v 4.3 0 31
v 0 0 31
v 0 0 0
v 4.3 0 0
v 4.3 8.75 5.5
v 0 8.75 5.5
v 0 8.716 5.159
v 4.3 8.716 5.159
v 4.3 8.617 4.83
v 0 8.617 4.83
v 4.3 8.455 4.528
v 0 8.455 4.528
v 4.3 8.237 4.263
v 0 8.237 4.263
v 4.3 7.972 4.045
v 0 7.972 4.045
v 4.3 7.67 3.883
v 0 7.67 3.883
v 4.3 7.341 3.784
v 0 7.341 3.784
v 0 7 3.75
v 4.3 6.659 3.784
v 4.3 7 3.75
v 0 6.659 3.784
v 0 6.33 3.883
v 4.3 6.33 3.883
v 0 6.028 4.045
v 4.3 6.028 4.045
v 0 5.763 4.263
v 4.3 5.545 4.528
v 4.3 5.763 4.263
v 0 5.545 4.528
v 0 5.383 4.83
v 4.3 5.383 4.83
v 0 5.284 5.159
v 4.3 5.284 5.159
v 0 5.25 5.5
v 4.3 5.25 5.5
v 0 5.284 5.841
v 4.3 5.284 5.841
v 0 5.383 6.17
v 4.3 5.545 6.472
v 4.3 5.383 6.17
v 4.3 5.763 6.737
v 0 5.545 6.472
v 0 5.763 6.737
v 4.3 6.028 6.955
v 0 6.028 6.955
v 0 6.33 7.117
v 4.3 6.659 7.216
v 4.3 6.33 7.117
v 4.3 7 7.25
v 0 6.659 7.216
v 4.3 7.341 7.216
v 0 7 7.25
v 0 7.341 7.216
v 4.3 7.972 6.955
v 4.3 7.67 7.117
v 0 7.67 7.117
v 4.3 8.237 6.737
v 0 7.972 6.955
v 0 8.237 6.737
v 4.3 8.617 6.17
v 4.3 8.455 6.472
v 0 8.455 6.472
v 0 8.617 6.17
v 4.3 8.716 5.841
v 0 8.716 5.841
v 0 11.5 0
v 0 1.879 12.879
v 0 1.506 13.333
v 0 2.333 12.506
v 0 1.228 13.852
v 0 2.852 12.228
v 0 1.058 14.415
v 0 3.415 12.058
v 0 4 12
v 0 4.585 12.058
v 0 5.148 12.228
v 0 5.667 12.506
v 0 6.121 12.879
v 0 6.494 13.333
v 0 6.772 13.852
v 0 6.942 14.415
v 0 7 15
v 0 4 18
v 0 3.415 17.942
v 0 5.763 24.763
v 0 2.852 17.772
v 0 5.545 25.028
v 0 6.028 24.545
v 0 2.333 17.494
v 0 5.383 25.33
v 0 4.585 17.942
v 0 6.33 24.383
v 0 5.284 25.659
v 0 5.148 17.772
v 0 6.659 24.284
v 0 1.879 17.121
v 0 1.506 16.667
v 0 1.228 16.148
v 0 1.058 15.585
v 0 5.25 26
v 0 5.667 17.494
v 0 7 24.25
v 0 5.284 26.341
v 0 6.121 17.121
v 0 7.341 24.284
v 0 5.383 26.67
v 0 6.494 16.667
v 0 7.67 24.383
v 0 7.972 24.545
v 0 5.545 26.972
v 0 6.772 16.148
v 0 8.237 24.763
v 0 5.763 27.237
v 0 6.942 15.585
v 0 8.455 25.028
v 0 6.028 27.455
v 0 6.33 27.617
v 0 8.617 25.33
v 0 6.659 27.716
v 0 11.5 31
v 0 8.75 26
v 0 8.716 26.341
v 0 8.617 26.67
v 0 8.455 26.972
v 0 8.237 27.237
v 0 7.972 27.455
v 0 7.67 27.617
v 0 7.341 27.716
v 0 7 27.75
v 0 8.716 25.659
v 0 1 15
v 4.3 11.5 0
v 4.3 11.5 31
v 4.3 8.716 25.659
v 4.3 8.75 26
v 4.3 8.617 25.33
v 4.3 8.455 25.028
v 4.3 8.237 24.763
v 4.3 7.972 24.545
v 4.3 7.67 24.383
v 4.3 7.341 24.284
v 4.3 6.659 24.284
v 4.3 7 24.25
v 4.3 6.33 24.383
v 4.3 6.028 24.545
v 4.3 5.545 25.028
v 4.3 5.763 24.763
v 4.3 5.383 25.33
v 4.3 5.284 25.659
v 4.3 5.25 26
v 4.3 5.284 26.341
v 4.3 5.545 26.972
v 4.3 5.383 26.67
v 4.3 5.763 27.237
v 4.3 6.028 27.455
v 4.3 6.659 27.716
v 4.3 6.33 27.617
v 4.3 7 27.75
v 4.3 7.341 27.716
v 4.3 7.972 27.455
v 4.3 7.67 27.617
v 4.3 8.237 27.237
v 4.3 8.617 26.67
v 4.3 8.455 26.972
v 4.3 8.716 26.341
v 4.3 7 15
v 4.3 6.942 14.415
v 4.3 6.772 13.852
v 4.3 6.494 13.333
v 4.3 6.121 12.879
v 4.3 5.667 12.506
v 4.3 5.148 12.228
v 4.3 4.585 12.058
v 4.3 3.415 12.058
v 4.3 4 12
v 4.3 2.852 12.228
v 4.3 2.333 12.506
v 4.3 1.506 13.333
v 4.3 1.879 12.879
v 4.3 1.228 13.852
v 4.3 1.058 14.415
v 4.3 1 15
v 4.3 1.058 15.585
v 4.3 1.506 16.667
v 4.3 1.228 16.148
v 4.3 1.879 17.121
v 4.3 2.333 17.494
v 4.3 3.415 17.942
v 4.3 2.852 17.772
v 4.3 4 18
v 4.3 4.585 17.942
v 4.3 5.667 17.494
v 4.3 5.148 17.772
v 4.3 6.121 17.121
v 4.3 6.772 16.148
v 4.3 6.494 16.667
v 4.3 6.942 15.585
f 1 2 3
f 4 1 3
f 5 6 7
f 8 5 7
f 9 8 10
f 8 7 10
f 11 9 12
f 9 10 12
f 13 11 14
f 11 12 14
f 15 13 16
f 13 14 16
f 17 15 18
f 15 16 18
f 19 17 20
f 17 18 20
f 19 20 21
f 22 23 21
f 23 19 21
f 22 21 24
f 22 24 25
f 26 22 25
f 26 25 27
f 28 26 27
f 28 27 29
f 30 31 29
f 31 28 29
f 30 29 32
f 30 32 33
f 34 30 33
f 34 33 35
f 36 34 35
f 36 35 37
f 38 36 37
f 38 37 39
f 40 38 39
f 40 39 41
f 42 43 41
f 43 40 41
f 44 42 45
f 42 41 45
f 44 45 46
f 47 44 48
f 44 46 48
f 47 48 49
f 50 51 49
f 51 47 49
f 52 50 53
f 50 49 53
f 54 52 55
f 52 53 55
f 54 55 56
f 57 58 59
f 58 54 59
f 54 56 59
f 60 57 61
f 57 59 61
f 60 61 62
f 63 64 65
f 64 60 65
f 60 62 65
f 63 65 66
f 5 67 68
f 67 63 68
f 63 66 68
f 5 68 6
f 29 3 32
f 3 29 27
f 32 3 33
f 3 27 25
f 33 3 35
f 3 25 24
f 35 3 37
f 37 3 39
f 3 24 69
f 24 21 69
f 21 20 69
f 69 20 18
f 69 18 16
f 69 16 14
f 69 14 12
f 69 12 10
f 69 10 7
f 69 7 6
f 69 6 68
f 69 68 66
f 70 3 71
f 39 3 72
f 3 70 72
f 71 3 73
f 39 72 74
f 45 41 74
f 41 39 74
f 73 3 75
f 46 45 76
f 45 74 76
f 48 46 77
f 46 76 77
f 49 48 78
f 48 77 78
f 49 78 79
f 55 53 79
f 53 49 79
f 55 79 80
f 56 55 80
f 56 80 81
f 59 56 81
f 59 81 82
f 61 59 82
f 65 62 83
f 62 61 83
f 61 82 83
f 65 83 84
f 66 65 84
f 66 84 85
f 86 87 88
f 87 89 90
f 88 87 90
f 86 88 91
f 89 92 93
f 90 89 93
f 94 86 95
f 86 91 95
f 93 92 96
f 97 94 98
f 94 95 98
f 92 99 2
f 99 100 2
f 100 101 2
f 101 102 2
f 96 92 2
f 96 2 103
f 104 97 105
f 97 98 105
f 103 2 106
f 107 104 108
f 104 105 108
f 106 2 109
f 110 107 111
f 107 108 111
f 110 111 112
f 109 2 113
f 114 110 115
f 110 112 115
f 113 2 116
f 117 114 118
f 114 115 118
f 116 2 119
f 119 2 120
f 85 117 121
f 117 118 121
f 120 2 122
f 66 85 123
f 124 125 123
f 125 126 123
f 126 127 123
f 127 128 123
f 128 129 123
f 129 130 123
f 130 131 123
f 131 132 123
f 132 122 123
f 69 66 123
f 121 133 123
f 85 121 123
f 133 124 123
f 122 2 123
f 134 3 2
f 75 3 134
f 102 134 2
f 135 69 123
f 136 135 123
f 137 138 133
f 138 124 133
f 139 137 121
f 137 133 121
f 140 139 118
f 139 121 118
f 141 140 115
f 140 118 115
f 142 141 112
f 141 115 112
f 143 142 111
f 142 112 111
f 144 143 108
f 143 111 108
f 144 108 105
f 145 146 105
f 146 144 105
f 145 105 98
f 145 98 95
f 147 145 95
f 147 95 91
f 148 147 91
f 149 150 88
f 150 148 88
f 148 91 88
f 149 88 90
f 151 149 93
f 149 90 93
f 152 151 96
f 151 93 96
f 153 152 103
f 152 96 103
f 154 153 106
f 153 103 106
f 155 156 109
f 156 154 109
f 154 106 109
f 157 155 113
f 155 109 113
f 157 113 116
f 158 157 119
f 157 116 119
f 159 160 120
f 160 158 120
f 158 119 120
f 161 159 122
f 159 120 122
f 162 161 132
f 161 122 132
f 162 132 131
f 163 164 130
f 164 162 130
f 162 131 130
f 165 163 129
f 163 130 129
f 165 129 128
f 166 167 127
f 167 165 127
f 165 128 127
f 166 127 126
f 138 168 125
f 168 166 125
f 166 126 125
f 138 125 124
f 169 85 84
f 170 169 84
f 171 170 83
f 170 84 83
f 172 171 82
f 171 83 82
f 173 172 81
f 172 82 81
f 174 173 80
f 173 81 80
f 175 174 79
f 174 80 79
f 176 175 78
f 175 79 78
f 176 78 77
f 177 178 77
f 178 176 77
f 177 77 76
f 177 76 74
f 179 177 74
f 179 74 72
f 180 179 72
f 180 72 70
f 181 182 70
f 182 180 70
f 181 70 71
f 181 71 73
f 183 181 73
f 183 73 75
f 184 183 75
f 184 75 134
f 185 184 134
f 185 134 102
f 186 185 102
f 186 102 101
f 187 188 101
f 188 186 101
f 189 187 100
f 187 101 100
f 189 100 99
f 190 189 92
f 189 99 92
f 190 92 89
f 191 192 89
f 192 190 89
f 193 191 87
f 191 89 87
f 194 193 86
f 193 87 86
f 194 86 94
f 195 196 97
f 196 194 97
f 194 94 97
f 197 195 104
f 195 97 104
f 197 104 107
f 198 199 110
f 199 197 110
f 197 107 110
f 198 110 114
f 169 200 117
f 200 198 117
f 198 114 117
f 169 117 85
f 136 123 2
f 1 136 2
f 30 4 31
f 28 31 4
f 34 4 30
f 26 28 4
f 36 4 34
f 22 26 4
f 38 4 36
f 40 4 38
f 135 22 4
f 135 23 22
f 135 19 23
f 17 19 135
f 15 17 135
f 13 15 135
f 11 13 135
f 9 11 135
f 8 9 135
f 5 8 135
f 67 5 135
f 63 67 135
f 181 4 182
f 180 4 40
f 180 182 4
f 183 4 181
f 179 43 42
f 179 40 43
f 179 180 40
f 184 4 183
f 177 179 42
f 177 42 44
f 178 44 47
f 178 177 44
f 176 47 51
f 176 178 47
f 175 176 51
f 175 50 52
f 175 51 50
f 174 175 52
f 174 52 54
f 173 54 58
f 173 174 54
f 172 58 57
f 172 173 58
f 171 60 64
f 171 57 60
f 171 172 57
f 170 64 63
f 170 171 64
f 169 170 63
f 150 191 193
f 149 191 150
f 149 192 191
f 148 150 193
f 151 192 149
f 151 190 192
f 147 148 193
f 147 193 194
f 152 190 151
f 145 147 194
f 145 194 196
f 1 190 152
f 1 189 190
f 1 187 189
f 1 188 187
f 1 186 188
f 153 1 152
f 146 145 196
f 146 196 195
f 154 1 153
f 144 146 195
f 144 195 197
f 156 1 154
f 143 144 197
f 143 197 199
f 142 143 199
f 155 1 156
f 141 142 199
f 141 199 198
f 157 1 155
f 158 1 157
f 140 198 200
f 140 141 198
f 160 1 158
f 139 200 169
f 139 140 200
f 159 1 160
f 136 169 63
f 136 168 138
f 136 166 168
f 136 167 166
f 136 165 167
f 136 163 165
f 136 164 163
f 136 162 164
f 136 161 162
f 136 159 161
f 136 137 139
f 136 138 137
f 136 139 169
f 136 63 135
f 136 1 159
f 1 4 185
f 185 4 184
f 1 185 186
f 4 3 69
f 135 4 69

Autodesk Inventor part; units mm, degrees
ref_plane "YZ Plane" through (0, 0, 0) normal (1, 0, 0) x (0, 1, 0)
ref_plane "XZ Plane" through (0, 0, 0) normal (0, 1, 0) x (-1, 0, 0)
ref_plane "XY Plane" through (0, 0, 0) normal (0, 0, 1) x (1, 0, 0)
sketch "Sketch1" plane through (0, 0, 0) normal (1, 0, 0) x (0, 1, 0)
  line L0 (0, 0) -> (11.5, 0)
  line L1 (11.5, 0) -> (11.5, 31)
  line L2 (11.5, 31) -> (0, 31)
  line L3 (0, 31) -> (0, 0)
  line L4 (0, 15) -> (4, 15) construction
  circle A0 centre (4, 15) radius 3
  line L5 (7, 26) -> (7, 5.5) construction
  circle A1 centre (7, 26) radius 1.75
  circle A2 centre (7, 5.5) radius 1.75
  dimension "d0" = 4
  dimension "d1" = 6
  dimension "d2" = 20.5
  dimension "d3" = 9.5
  dimension "d4" = 3.5
  dimension "d5" = 7
  dimension "d6" = 11.5
  dimension "d7" = 15
  dimension "d8" = 16
extrude "Extrusion1" add sketch "Sketch1" along normal blind 4.3
properties part number "TrayPanelL"
